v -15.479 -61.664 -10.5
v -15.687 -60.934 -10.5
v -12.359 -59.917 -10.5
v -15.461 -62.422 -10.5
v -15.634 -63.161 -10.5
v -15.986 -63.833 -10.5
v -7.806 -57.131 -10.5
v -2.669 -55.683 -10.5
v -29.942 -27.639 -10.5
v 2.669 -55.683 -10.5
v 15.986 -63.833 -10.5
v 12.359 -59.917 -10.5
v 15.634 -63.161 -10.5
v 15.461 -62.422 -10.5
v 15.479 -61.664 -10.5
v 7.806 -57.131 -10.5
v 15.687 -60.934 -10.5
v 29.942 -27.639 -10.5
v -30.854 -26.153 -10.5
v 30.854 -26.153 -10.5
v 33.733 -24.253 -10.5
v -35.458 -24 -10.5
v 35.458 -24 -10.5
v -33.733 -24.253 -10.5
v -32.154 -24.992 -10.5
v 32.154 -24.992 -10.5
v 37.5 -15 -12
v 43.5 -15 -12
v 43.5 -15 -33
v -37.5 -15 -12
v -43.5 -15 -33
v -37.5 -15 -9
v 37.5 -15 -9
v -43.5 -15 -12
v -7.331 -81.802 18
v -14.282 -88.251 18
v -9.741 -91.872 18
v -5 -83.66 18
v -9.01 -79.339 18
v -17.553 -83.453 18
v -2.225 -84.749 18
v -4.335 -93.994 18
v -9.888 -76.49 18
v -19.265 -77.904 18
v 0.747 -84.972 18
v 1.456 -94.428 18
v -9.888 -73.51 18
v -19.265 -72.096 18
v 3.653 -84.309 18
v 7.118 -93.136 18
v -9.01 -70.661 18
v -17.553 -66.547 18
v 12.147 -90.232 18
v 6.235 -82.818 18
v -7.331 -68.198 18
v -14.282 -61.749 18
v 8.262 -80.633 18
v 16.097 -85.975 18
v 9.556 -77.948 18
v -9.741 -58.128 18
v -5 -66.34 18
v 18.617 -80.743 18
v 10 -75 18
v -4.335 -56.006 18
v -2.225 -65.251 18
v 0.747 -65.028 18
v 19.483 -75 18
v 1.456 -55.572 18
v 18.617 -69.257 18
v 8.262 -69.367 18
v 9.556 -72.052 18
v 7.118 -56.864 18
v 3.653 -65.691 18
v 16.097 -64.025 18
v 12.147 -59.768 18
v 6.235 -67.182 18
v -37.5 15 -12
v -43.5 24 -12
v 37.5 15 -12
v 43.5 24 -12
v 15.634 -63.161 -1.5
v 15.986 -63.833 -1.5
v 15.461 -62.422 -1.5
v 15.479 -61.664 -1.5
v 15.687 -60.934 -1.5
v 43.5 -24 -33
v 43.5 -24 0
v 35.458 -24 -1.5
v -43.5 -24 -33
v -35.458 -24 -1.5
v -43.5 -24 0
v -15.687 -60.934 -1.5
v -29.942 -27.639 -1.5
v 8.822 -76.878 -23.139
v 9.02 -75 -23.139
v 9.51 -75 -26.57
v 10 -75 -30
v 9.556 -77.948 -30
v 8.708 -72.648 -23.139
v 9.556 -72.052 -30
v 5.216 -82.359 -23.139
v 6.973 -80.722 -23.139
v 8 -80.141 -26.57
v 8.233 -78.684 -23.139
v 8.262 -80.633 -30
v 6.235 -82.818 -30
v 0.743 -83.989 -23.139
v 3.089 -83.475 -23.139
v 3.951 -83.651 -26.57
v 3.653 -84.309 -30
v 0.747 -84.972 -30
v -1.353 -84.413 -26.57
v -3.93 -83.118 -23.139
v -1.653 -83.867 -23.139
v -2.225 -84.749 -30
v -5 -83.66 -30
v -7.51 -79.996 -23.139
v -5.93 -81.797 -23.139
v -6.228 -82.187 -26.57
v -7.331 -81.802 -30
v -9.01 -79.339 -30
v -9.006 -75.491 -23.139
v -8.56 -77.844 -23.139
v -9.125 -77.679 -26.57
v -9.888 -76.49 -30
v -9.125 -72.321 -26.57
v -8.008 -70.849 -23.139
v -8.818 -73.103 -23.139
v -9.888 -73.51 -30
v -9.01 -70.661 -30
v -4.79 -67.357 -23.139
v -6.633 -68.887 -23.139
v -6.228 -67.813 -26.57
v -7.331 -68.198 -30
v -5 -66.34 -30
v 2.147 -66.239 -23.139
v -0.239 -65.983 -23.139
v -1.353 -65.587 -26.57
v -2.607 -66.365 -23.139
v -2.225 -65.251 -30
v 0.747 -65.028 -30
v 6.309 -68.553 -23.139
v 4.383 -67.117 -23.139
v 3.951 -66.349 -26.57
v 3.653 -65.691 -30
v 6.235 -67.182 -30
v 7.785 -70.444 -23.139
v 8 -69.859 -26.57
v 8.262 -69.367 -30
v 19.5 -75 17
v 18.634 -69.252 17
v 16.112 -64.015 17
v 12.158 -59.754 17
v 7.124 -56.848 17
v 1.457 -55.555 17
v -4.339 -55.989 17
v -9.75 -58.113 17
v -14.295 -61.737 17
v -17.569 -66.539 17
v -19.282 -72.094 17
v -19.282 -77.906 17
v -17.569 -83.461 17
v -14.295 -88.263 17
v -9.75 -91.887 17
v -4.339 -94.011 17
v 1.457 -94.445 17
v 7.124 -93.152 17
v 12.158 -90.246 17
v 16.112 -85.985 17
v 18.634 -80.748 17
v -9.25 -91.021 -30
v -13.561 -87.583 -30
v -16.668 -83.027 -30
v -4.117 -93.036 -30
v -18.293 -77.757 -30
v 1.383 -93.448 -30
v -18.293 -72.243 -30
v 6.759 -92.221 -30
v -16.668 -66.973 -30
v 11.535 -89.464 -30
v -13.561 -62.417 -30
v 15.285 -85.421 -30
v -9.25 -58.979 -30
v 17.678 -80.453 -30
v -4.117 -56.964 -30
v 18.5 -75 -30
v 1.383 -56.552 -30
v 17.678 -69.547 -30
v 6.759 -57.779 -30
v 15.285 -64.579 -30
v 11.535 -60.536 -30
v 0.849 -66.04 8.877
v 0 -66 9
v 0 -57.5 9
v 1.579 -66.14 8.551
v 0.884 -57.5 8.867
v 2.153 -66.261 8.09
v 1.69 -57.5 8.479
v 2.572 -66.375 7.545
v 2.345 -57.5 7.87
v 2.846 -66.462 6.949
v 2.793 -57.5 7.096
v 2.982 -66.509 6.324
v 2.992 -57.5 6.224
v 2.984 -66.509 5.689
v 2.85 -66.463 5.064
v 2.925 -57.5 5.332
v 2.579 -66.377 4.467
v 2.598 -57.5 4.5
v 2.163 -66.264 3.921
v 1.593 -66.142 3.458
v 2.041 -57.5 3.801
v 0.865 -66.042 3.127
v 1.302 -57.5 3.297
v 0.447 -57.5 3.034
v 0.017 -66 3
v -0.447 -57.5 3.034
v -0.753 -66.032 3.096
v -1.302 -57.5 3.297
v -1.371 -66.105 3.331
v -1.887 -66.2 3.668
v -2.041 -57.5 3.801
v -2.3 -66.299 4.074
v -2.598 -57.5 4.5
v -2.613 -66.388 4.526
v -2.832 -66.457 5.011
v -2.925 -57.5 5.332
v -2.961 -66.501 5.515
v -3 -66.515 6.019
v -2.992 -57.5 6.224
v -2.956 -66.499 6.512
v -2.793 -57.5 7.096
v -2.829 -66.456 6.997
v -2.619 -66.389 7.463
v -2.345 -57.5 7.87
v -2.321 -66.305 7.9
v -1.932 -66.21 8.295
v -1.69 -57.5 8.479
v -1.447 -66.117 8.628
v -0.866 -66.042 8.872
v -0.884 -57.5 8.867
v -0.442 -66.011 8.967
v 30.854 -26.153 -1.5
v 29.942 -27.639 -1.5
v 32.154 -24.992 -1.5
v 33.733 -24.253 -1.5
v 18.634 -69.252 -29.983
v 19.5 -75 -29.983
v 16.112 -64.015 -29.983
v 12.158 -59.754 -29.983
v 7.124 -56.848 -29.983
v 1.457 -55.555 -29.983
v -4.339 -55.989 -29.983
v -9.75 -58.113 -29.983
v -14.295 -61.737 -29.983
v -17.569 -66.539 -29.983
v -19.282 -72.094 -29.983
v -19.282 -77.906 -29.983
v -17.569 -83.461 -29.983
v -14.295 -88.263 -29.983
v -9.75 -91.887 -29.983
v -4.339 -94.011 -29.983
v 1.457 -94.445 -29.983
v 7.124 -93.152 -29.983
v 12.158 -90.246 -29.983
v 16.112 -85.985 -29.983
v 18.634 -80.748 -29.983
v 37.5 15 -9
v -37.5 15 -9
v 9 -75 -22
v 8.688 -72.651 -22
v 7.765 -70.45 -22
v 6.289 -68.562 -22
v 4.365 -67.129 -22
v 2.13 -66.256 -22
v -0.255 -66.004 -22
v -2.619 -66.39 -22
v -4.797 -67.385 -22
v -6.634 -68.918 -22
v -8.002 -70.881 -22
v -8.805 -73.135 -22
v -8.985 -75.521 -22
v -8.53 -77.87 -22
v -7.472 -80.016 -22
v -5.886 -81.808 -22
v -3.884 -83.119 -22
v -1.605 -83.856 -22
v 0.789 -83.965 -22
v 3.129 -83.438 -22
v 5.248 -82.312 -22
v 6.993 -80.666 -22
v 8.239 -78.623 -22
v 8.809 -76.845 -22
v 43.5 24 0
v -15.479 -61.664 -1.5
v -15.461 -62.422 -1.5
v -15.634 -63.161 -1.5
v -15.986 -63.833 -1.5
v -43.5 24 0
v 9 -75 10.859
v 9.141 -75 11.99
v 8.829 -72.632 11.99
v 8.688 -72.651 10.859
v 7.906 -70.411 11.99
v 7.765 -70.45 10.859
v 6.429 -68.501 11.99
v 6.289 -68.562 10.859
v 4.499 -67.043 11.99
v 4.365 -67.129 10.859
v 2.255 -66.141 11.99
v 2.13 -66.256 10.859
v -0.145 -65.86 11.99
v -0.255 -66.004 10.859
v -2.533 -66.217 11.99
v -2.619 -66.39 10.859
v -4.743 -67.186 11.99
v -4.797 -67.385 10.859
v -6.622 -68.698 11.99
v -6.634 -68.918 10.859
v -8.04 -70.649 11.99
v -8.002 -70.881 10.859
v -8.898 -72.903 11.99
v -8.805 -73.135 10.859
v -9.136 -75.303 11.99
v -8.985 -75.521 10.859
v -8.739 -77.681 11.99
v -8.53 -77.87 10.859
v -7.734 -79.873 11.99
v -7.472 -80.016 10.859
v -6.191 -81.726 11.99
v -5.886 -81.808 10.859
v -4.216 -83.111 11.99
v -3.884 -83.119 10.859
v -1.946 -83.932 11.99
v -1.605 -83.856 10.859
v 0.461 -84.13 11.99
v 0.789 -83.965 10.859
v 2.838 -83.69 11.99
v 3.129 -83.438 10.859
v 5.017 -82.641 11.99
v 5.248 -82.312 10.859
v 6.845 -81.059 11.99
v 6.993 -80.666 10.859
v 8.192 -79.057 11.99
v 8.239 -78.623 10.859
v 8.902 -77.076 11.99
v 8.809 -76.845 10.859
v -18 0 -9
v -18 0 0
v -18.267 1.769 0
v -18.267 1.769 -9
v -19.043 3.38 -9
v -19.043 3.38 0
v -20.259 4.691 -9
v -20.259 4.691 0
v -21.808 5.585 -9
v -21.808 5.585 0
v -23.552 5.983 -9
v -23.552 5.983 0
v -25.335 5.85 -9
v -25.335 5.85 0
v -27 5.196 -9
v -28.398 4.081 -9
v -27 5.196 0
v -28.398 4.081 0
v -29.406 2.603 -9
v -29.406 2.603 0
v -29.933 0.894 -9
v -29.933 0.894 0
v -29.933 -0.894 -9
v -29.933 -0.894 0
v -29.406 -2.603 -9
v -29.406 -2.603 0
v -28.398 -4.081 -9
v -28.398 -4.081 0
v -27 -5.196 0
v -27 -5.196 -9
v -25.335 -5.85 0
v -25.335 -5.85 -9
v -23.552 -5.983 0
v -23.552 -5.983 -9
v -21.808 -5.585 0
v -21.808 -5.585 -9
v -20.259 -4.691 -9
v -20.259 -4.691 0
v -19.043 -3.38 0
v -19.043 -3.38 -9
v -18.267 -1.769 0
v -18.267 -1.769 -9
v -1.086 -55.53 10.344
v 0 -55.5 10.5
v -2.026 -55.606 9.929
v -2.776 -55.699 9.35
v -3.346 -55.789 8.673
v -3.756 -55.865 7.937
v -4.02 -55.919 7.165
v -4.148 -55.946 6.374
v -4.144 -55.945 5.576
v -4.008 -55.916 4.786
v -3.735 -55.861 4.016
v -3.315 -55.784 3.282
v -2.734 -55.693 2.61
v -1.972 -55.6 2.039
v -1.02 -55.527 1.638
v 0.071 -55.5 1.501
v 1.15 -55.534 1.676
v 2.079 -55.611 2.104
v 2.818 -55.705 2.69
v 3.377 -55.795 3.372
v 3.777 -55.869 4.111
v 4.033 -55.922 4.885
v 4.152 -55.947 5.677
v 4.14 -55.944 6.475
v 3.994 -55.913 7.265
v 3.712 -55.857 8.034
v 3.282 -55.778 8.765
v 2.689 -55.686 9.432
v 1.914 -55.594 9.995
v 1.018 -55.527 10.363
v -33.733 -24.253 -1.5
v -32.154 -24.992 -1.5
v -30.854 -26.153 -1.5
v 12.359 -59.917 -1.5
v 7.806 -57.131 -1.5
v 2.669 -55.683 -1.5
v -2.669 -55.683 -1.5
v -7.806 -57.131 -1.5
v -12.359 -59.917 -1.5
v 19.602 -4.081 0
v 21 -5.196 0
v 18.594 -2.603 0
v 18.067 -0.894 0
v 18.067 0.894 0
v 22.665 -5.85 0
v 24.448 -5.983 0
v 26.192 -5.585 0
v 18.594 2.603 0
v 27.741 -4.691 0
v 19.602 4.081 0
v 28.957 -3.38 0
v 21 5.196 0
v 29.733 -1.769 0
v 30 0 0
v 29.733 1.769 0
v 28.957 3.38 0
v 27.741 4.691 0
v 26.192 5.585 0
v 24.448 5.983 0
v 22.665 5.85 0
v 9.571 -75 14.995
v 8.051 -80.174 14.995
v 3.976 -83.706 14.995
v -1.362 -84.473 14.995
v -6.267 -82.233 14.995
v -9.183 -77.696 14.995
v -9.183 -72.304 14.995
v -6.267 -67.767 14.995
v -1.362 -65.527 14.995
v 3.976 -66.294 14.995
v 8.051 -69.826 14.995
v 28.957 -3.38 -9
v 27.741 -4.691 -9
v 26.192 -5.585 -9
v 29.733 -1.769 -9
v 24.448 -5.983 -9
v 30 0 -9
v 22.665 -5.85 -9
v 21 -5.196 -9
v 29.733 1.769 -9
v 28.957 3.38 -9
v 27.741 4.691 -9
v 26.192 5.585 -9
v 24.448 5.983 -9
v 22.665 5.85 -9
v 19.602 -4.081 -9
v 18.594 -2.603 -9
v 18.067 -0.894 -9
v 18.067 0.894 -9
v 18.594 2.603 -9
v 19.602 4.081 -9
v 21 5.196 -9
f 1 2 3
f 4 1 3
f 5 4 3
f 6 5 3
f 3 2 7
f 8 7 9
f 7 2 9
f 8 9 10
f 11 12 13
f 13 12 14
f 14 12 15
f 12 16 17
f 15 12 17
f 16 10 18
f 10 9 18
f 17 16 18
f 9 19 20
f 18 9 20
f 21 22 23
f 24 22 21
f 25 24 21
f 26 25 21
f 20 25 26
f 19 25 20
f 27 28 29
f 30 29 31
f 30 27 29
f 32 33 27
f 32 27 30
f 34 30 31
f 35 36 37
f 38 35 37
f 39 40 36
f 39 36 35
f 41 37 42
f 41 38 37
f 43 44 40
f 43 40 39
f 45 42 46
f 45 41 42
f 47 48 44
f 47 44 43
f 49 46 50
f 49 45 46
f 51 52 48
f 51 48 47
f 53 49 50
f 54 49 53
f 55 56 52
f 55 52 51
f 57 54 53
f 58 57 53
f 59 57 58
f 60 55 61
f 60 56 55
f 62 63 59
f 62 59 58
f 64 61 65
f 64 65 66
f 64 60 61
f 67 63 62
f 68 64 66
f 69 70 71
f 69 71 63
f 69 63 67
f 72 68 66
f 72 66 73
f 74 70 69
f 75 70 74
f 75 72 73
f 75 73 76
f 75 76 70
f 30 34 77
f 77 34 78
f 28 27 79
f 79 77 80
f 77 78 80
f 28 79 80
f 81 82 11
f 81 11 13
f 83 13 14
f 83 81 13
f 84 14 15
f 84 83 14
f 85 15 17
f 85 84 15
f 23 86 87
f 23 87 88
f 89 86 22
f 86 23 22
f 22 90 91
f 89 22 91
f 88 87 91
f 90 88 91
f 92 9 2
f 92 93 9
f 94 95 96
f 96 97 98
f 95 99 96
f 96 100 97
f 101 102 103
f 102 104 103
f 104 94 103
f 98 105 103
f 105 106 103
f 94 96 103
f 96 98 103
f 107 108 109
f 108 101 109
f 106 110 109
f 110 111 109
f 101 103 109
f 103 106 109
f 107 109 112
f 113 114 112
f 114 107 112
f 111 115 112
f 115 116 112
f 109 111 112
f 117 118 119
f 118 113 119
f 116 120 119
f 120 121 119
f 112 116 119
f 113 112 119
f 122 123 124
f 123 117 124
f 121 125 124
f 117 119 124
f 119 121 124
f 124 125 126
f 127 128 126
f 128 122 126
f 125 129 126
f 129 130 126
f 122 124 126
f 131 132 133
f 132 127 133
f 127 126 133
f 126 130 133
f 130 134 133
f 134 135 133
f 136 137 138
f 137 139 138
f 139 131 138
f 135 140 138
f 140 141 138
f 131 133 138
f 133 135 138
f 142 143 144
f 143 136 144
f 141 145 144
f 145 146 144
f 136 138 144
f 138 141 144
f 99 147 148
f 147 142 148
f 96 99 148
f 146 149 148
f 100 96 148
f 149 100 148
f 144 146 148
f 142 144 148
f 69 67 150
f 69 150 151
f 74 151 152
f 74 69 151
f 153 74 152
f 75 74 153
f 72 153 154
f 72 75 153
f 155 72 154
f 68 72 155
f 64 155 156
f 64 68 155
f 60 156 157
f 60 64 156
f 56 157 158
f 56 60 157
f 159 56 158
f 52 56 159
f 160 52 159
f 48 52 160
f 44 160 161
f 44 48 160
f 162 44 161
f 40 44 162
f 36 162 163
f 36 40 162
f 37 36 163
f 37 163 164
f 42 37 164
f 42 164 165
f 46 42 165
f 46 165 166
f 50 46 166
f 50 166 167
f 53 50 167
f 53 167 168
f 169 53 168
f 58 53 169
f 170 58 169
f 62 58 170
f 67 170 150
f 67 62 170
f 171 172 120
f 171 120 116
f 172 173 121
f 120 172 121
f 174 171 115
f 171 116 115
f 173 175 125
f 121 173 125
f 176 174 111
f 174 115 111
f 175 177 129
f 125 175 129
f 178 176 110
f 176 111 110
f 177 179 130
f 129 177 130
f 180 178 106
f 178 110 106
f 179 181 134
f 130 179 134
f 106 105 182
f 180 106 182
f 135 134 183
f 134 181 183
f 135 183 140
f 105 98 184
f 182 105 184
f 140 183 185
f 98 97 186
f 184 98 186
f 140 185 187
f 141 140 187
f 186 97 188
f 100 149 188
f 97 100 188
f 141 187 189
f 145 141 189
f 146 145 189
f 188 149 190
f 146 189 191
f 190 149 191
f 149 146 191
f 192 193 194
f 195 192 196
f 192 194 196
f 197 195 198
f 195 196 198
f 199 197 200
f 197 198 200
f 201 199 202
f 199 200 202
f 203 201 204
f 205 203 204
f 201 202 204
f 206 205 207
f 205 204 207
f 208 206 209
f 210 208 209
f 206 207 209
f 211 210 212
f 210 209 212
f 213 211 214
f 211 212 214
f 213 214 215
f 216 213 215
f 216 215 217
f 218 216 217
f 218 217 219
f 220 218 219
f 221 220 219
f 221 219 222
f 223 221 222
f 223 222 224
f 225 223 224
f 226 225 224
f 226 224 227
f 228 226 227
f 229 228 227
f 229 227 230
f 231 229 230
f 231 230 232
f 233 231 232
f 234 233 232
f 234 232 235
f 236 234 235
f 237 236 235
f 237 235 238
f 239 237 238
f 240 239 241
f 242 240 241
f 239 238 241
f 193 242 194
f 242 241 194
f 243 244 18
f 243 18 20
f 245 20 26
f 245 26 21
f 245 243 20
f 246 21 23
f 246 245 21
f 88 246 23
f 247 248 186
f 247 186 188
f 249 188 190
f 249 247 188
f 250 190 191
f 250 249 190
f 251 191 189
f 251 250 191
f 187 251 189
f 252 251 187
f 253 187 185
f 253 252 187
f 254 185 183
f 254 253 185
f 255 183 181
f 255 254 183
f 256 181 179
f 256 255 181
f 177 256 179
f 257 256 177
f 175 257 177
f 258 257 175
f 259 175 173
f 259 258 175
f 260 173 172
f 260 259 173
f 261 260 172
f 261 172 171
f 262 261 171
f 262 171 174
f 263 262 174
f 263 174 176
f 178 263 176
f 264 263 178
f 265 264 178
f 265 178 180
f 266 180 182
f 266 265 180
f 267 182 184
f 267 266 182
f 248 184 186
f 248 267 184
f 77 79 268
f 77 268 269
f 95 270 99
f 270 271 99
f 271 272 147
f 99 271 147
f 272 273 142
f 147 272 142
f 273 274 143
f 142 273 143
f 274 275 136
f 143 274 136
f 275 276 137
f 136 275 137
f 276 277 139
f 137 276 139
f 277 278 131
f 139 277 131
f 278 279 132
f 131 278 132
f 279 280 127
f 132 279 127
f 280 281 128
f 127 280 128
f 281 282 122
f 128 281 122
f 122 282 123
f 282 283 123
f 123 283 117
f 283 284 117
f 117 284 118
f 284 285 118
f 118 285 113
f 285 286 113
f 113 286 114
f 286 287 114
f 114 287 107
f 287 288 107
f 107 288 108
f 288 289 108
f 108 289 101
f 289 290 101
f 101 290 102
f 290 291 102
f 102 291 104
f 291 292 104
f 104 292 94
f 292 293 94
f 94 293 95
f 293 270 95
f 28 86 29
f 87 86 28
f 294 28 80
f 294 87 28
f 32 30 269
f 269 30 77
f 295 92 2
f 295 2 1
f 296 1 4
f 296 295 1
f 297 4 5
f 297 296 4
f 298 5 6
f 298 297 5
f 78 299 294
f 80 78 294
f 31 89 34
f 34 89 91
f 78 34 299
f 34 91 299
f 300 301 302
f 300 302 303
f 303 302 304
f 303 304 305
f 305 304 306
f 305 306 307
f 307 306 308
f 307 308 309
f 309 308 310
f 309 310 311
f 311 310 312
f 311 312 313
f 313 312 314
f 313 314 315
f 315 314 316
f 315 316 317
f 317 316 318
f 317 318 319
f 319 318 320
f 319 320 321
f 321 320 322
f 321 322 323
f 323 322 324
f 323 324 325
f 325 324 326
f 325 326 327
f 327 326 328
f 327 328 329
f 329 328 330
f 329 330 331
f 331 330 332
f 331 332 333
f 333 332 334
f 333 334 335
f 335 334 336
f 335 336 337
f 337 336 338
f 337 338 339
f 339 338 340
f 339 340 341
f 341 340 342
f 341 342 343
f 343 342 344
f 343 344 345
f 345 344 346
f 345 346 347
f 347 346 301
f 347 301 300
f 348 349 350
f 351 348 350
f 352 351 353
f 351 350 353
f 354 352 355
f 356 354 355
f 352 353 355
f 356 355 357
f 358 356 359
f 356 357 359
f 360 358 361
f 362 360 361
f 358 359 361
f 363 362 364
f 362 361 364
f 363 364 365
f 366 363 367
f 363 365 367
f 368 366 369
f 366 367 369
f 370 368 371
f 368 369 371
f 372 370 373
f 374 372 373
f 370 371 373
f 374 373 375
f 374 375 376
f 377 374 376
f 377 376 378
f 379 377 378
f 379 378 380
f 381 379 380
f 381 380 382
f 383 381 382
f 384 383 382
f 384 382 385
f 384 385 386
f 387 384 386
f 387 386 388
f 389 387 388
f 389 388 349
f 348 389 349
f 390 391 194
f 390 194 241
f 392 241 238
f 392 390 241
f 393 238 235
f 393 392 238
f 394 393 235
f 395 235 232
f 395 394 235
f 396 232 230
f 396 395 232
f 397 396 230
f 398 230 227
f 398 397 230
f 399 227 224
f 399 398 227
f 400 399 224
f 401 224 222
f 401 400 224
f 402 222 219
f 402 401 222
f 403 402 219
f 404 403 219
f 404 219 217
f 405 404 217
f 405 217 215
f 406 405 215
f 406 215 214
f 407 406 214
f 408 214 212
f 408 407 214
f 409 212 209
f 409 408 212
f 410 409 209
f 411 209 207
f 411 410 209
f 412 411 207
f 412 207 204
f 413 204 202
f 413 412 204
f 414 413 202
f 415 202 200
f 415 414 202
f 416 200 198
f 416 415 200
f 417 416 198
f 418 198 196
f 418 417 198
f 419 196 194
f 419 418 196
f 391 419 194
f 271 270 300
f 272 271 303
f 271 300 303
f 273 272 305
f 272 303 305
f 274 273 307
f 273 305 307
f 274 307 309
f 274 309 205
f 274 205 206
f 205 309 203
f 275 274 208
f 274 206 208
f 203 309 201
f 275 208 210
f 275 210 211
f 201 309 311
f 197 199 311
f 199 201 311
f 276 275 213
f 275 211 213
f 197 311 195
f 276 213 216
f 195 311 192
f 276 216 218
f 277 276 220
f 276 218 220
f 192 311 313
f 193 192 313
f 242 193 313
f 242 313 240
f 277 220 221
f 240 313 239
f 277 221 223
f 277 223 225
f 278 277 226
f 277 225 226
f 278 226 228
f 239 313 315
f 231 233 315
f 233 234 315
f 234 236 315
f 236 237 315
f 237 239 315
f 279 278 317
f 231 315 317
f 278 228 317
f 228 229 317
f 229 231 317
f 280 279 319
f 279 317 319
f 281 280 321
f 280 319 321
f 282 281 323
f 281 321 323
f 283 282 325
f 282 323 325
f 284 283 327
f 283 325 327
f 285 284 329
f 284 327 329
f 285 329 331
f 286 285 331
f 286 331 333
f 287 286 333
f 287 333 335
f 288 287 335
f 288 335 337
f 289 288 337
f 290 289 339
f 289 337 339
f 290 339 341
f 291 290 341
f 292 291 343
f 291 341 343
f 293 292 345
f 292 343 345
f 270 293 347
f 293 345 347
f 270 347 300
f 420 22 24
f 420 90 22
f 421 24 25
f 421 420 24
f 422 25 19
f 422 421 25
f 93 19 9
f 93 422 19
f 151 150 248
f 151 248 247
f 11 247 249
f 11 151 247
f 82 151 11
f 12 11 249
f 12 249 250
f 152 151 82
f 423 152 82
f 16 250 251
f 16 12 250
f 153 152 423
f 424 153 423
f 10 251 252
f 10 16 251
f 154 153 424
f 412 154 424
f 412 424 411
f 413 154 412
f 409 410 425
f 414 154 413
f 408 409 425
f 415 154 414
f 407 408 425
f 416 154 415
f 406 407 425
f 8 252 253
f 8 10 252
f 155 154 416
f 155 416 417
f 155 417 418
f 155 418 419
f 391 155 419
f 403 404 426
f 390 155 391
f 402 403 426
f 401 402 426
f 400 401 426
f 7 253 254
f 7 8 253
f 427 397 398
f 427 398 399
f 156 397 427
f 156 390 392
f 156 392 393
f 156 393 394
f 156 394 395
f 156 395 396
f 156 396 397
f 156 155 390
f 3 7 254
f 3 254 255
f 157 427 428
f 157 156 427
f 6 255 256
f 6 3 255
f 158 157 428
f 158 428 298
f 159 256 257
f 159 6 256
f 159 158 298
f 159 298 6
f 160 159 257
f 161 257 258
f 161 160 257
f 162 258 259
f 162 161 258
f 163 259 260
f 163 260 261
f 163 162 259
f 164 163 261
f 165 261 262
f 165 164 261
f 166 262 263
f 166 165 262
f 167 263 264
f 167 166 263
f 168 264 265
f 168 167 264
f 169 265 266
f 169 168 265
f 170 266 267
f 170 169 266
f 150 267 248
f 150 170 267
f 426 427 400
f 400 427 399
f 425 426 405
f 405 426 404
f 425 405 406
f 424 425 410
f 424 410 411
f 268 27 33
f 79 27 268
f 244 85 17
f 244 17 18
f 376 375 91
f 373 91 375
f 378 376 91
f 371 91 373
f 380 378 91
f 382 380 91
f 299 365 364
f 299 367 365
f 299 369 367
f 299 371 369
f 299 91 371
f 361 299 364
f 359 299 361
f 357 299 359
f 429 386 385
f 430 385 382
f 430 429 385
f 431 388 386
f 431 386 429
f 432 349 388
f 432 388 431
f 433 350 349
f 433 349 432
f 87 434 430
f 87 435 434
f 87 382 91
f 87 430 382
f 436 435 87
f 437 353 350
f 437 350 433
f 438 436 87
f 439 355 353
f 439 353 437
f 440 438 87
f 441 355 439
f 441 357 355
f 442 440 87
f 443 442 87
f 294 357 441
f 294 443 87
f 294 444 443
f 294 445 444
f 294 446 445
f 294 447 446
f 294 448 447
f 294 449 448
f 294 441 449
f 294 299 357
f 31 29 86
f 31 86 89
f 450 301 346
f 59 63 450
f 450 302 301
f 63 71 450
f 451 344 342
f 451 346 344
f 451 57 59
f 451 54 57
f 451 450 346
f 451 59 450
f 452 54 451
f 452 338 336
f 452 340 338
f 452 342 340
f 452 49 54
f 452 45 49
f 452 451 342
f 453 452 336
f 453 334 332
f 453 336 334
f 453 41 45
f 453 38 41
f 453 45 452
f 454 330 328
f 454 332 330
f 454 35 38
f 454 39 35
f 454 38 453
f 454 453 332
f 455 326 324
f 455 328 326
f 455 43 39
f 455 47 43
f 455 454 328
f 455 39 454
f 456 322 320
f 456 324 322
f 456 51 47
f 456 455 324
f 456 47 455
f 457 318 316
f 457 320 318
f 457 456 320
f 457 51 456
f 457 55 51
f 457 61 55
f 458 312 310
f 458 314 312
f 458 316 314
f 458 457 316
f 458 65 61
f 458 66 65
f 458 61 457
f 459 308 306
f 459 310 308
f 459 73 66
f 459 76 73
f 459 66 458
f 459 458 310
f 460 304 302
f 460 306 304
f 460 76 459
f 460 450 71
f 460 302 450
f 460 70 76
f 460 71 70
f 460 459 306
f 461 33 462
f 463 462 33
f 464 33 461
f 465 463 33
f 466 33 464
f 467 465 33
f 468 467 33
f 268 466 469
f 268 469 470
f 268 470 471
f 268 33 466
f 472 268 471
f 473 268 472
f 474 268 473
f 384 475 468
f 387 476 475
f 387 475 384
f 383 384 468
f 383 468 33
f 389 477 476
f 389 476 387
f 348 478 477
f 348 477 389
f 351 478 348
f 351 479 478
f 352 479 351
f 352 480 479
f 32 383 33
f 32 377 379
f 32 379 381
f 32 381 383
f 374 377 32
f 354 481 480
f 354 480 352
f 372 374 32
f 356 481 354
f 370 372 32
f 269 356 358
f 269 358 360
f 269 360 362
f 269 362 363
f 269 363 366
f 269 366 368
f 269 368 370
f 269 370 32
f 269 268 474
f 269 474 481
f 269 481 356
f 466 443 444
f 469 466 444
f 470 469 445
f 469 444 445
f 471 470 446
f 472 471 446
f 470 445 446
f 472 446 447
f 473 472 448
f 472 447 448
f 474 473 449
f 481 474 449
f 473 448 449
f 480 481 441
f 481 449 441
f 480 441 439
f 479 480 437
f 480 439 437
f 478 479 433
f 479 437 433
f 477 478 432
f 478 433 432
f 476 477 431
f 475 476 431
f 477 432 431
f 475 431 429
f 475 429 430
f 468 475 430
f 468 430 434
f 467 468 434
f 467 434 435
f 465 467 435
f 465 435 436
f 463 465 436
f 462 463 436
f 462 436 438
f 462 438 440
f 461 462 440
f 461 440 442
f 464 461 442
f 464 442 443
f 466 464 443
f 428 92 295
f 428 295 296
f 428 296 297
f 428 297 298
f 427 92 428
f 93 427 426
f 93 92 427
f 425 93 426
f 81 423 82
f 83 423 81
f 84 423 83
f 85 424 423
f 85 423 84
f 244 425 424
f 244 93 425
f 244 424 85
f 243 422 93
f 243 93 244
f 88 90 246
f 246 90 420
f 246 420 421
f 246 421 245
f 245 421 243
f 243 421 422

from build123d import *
from OCP.BRepFilletAPI import BRepFilletAPI_MakeChamfer

# Parameters (mm, degrees)
SKETCH_1_W               = 87
SKETCH_1_H               = 48
EXTRUDE_1_DEPTH          = 12
SKETCH_3_W               = 75
SKETCH_3_H               = 30
CUT_EXTRUDE_1_DEPTH      = 3
SKETCH_4_R               = 6
CUT_EXTRUDE_2_DEPTH      = 52.110175112
SKETCH_5_W               = 87
SKETCH_5_H               = 9
EXTRUDE_2_DEPTH          = 21
SKETCH_7_R               = 19.5
EXTRUDE_3_DEPTH          = 24
SKETCH_8_R               = 9
CUT_EXTRUDE_3_DEPTH      = 17
EXTRUDE_4_DEPTH          = 4.5
CUT_EXTRUDE_4_REACH      = 98.444
CUT_EXTRUDE_4_END_RADIUS = 9
SKETCH_13_R              = 3
CHAMFER_6_SIZE           = 1
CHAMFER_6_SIZE2          = 0.14060595
CHAMFER_6_SIZE2_2        = 0.017455065


with BuildPart() as part:
    # 草图1 → 凸台-拉伸1 (new body)
    with BuildSketch(Plane.XY):
        Rectangle(SKETCH_1_W, SKETCH_1_H)
    extrude(amount=-EXTRUDE_1_DEPTH)

    # 草图3 → 切除-拉伸1 (cut)
    with BuildSketch(Plane(origin=(0, 0, -12), x_dir=(-1, 0, 0), z_dir=(0, 0, -1))):
        Rectangle(SKETCH_3_W, SKETCH_3_H)
    extrude(amount=-CUT_EXTRUDE_1_DEPTH, mode=Mode.SUBTRACT)

    # 草图4 → 切除-拉伸2 (cut, through all)
    with BuildSketch(Plane.XY):
        with Locations((24, 0)):
            Circle(SKETCH_4_R)
        with Locations((-24, 0)):
            Circle(SKETCH_4_R)
    extrude(amount=-CUT_EXTRUDE_2_DEPTH, mode=Mode.SUBTRACT)

    # 草图5 → 凸台-拉伸2 (add)
    with BuildSketch(Plane(origin=(0, 0, -12), x_dir=(-1, 0, 0), z_dir=(0, 0, -1))):
        with Locations((0, -19.5)):
            Rectangle(SKETCH_5_W, SKETCH_5_H)
    extrude(amount=EXTRUDE_2_DEPTH)



with BuildPart() as body_2:
    # 草图7 → 凸台-拉伸3 (new, symmetric)
    with BuildSketch(Plane.XY.offset(-6)):
        with Locations((0, -75)):
            Circle(SKETCH_7_R)
    extrude(amount=EXTRUDE_3_DEPTH, both=True)

    # 草图8 → 切除-拉伸3 (cut, symmetric)
    with BuildSketch(Plane.XY.offset(-6)):
        with Locations((0, -75)):
            Circle(SKETCH_8_R)
    extrude(amount=CUT_EXTRUDE_3_DEPTH, both=True, mode=Mode.SUBTRACT)

    # 草图10 → 切除-旋转1 (revolve, cut)
    with BuildSketch(Plane(origin=(0, -75, 0), x_dir=(1, 0, 0), z_dir=(0, 1, 0))):
        Polygon((0, -18), (0, -11), (9, -11), (10, -18), align=None)
    cut_revolve_1 = revolve(axis=Axis((0, -75, 18), (0, 0, -1)), mode=Mode.SUBTRACT)

    # 镜向1: 切除-旋转1 across plane
    add(cut_revolve_1.mirror(Plane.XY.offset(-6)), mode=Mode.SUBTRACT)


with BuildPart() as part_1:
    add(part.part)

    add(body_2.part)  # 凸台-拉伸4 merges body 2
    # 草图12 → 凸台-拉伸4 (add, symmetric)
    with BuildSketch(Plane.XY.offset(-6)):
        with BuildLine():
            Line((-29.942238006, -27.63856044), (-15.687432014, -60.934386997))
            ThreePointArc((-15.687432014, -60.934386997), (-15.461093284, -62.422417649), (-15.985936875, -63.83309254))
            ThreePointArc((-15.985936875, -63.83309254), (0, -55.5), (15.985936875, -63.83309254))
            ThreePointArc((15.985936875, -63.83309254), (15.461093284, -62.422417649), (15.687432014, -60.934386997))
            Line((15.687432014, -60.934386997), (29.942238006, -27.63856044))
            ThreePointArc((29.942238006, -27.63856044), (32.154108719, -24.99157523), (35.457997537, -24))
            Line((35.457997537, -24), (-35.457997537, -24))
            ThreePointArc((-35.457997537, -24), (-32.154108719, -24.99157523), (-29.942238006, -27.63856044))
        make_face()
    extrude(amount=EXTRUDE_4_DEPTH, both=True)

    # 切除-拉伸4: up to this cylinder (the profile starts outside it)
    cut_extrude_4_end = Plane(origin=(0, -75, 6), z_dir=(0, 0, 1)) * Cylinder(CUT_EXTRUDE_4_END_RADIUS, 215.888, mode=Mode.PRIVATE)
    # 草图13 → 切除-拉伸4 (cut, up to the surface)
    with BuildSketch(Plane(origin=(0, -55.5, 0), x_dir=(1, 0, 0), z_dir=(0, 1, 0)), mode=Mode.PRIVATE) as cut_extrude_4_sk1:
        with Locations(Location((0, -6, 0), (0, 0, 270))):
            Circle(SKETCH_13_R)
    cut_extrude_4_tool1 = extrude(cut_extrude_4_sk1.sketch, amount=-CUT_EXTRUDE_4_REACH, mode=Mode.PRIVATE) - cut_extrude_4_end
    add(cut_extrude_4_tool1.solids().sort_by_distance((0, -55.5, 6))[0], mode=Mode.SUBTRACT)

    # 草图14 → 切除-旋转2 (revolve, cut)
    with BuildSketch(Plane.XY.offset(6), mode=Mode.PRIVATE) as cut_revolve_2_sk:
        Polygon((0, -55.5), (0, -57.5), (3, -57.5), (4.5, -55.5), align=None)
    revolve(cut_revolve_2_sk.sketch.rotate(Axis((0, -55.5, 6), (0, -1, 0)), 90), axis=Axis((0, -55.5, 6), (0, -1, 0)), mode=Mode.SUBTRACT)

    # 倒角6: one chamfer whose edges measure the first distance from different faces: ONE call of the kernel's chamfer builder (chamfer() names one face for all edges)
    chamfer_6_edges_1 = [part_1.edges().sort_by_distance(p)[0] for p in [
        (-9, -75, 11),
    ]]
    chamfer_6_side_1 = [part_1.faces().sort_by_distance(p)[0] for p in [
        (-9.5, -75, 14.5),
    ]]
    chamfer_6_edges_2 = [part_1.edges().sort_by_distance(p)[0] for p in [
        (-19.5, -75, -30),
    ]]
    chamfer_6_side_2 = [part_1.faces().sort_by_distance(p)[0] for p in [
        (-18.948456711, -75, -30),
    ]]
    chamfer_6_edges_3 = [part_1.edges().sort_by_distance(p)[0] for p in [
        (-19.5, -75, 18),
    ]]
    chamfer_6_side_3 = [part_1.faces().sort_by_distance(p)[0] for p in [
        (-19.5, -75, -6),
    ]]
    chamfer_6_edges_4 = [part_1.edges().sort_by_distance(p)[0] for p in [
        (-9, -75, -23),
    ]]
    chamfer_6_side_4 = [part_1.faces().sort_by_distance(p)[0] for p in [
        (-9, -75, -6),
    ]]
    chamfer_6 = BRepFilletAPI_MakeChamfer(part_1.part.solid().wrapped)
    for e in chamfer_6_edges_1:
        chamfer_6.Add(CHAMFER_6_SIZE, CHAMFER_6_SIZE2, e.wrapped, chamfer_6_side_1[0].wrapped)  # the first distance lies on this face
    for e in chamfer_6_edges_2:
        chamfer_6.Add(CHAMFER_6_SIZE, CHAMFER_6_SIZE2_2, e.wrapped, chamfer_6_side_2[0].wrapped)  # the first distance lies on this face
    for e in chamfer_6_edges_3:
        chamfer_6.Add(CHAMFER_6_SIZE, CHAMFER_6_SIZE2_2, e.wrapped, chamfer_6_side_3[0].wrapped)  # the first distance lies on this face
    for e in chamfer_6_edges_4:
        chamfer_6.Add(CHAMFER_6_SIZE, CHAMFER_6_SIZE2, e.wrapped, chamfer_6_side_4[0].wrapped)  # the first distance lies on this face
    add(Compound.cast(chamfer_6.Shape()), mode=Mode.REPLACE)


solid = part_1.part
